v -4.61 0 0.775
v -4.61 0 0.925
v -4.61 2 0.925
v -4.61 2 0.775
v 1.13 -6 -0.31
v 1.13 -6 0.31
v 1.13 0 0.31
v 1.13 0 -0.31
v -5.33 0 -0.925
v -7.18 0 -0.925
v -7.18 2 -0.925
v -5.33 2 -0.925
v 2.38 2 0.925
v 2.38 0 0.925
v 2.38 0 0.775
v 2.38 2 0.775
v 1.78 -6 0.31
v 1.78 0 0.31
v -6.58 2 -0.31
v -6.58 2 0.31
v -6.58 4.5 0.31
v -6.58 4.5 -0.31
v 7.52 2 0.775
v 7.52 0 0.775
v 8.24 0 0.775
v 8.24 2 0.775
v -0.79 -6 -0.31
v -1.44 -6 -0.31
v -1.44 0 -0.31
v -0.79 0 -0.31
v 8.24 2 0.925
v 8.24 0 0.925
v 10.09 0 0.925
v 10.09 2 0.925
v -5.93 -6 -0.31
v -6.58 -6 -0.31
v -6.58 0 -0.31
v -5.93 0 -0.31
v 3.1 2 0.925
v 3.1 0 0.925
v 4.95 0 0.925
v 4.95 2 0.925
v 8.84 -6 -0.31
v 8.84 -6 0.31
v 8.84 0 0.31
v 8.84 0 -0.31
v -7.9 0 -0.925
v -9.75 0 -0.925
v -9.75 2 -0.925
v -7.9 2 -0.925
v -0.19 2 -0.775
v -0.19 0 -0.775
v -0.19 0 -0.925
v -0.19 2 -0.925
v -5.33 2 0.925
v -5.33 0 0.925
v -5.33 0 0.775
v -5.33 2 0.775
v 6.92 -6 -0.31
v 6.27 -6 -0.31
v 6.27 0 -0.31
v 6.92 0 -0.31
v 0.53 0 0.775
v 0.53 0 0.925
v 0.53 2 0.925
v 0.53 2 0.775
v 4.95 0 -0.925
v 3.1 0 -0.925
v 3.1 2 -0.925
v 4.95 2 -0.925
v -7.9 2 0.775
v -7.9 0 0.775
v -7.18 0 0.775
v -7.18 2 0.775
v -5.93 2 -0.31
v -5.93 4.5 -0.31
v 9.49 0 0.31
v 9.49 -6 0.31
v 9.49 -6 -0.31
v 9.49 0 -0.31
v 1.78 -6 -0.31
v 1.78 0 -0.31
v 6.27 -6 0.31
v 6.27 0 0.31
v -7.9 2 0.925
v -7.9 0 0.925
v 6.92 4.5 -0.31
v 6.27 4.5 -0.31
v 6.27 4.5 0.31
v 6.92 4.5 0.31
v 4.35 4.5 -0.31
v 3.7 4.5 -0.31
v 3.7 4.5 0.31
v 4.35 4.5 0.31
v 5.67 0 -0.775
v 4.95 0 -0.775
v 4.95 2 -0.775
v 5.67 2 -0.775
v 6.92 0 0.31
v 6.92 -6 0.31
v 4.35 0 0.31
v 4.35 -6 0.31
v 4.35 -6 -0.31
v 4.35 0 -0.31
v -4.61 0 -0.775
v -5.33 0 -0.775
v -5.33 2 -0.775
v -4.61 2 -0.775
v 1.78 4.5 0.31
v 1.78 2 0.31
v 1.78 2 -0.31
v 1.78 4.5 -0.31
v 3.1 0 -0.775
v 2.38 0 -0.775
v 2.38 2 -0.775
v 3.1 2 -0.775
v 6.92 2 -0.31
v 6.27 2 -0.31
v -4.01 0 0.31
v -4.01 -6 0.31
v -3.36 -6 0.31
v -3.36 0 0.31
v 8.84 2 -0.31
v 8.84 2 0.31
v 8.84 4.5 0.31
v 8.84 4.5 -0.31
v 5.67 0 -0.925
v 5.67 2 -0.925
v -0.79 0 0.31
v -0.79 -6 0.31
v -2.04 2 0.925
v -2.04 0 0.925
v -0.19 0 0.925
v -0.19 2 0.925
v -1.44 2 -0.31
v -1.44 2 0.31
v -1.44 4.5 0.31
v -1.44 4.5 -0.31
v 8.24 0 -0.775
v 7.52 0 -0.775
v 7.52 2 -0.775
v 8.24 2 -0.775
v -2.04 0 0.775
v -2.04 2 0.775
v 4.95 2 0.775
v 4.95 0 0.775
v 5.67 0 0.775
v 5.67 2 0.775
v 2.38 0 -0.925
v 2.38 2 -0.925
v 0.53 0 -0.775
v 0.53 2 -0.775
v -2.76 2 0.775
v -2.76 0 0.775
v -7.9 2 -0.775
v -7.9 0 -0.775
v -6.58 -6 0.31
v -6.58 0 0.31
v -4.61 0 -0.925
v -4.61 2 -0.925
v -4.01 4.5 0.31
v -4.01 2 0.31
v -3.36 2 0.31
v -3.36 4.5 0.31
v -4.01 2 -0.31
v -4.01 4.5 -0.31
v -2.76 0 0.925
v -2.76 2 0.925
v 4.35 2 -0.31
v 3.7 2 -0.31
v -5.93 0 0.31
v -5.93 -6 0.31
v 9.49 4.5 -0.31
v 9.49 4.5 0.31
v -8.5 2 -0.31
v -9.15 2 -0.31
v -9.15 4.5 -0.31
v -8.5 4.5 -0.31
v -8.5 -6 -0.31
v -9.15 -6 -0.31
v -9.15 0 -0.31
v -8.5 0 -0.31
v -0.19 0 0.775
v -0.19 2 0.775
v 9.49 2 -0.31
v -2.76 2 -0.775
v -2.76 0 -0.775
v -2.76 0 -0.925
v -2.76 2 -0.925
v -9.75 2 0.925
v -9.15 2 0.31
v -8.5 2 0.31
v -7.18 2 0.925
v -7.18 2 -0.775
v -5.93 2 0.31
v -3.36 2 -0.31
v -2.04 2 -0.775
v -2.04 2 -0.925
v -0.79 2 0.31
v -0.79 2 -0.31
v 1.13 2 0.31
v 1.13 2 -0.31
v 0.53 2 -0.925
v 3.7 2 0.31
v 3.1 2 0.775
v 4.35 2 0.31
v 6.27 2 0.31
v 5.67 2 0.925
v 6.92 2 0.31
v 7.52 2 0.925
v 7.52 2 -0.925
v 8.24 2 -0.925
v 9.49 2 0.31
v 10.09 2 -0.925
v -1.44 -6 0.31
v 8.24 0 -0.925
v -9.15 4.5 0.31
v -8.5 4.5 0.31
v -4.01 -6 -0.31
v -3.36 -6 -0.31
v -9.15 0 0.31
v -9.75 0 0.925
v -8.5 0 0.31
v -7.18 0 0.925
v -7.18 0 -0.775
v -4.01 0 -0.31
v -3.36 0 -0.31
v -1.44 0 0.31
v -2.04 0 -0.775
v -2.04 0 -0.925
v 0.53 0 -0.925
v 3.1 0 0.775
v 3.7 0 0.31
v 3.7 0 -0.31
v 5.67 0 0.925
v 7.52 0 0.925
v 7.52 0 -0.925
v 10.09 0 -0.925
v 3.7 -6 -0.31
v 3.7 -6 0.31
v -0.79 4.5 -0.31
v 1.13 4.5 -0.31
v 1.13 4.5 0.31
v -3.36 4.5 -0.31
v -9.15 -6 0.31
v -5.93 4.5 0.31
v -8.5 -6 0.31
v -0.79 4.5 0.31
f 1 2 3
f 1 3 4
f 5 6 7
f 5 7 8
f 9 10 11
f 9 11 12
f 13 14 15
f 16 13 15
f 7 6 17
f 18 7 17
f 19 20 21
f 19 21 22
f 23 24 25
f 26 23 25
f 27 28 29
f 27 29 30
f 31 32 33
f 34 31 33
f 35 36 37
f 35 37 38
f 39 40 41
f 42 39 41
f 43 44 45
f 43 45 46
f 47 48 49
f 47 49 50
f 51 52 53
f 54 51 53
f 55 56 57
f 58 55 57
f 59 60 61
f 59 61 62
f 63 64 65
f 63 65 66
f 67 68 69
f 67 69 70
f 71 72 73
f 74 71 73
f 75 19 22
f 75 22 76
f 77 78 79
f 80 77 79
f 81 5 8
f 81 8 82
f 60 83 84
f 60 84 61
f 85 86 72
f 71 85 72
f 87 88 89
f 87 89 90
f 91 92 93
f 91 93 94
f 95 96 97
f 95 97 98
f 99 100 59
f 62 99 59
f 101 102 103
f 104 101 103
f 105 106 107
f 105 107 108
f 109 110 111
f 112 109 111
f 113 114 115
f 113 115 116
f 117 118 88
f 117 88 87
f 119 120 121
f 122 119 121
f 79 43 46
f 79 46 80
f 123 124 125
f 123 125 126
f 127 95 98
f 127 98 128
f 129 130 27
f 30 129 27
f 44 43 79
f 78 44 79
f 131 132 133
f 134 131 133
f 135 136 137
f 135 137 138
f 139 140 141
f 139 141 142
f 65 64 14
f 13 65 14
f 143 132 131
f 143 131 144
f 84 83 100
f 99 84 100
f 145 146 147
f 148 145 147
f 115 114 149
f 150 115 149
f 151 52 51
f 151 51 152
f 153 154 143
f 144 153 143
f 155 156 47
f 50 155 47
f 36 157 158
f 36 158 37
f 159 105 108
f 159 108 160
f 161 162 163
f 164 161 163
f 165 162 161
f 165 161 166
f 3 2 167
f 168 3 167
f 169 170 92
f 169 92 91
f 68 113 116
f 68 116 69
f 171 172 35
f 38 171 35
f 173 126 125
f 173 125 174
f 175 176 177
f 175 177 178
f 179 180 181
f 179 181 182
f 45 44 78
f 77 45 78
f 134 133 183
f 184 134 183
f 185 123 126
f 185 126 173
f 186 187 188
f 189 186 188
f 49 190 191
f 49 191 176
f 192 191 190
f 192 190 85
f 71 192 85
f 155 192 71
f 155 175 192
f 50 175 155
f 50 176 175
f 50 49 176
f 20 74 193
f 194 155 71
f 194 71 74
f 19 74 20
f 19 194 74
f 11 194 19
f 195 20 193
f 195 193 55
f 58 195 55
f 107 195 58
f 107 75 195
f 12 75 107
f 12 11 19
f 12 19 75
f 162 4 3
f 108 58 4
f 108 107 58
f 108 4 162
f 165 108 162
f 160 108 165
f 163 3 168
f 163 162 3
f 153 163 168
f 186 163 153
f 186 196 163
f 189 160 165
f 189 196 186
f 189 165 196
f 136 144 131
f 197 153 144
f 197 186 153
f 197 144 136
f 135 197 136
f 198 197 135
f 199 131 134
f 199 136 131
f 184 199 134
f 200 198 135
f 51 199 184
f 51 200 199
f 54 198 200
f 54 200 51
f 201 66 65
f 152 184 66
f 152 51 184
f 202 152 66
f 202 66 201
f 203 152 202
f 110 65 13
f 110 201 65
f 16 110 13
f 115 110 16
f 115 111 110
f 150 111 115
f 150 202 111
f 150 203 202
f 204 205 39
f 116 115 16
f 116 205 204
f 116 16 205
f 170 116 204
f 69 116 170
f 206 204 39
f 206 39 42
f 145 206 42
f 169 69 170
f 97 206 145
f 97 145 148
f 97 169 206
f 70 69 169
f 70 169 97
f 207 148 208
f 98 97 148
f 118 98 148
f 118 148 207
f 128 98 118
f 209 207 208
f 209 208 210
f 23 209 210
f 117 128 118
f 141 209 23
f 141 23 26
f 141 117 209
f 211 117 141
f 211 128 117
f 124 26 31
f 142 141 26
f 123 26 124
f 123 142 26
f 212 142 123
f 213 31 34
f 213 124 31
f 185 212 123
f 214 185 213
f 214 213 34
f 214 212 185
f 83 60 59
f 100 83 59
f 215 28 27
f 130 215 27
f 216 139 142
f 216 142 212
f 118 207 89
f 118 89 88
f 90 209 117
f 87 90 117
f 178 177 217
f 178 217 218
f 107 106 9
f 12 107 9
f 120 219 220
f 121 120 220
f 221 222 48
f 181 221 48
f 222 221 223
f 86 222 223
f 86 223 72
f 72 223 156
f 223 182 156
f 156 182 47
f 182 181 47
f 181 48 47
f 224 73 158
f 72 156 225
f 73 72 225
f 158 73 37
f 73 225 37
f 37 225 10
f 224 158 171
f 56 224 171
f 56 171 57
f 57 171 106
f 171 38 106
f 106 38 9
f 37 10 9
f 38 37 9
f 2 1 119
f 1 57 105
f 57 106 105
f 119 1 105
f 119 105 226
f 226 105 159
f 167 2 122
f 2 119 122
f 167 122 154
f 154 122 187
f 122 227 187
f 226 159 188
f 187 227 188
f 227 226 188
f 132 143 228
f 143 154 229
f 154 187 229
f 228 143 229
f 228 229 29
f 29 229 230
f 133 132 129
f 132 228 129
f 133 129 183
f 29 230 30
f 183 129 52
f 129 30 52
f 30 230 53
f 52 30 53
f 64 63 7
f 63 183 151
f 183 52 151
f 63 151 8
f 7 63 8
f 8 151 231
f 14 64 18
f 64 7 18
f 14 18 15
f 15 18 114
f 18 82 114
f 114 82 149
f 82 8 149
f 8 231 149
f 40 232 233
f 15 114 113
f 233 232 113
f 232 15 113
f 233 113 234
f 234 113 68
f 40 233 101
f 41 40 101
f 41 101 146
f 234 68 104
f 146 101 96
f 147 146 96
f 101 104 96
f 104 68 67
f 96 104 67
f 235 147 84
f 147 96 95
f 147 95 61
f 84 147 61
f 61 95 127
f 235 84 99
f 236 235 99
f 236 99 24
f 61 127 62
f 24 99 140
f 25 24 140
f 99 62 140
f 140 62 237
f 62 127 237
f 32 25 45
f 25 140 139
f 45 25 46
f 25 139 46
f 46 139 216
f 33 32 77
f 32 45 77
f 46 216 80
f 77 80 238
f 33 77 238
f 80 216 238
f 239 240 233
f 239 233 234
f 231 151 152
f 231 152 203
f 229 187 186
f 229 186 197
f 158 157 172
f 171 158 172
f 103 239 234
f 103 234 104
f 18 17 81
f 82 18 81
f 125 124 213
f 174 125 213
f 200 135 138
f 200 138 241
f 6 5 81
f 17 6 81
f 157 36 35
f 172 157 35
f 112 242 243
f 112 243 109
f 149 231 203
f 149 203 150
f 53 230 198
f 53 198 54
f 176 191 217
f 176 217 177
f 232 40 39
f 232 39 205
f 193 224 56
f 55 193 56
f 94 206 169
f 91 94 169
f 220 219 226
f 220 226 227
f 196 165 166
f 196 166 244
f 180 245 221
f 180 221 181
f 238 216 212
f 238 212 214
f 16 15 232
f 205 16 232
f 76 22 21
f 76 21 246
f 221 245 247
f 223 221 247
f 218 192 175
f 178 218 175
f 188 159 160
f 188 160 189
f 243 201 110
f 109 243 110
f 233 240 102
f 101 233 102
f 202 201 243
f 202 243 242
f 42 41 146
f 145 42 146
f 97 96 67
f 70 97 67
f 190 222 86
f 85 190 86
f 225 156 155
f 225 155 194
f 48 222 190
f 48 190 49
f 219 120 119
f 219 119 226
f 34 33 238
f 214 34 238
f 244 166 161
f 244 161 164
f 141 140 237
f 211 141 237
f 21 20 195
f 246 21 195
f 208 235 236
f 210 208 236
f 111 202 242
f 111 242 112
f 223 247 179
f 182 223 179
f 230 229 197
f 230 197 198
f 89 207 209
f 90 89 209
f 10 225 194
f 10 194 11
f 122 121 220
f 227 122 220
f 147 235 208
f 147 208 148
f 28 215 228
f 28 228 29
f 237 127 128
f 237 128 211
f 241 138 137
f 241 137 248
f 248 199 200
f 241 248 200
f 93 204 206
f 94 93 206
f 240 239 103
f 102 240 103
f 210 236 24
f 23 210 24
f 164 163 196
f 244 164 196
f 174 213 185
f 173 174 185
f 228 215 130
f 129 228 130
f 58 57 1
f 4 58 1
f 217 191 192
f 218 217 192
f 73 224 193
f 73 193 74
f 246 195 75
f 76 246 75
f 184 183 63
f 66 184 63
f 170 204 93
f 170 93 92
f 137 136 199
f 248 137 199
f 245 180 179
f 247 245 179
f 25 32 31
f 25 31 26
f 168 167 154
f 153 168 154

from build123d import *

# Parameters (mm, degrees)
SKETCH1_W                = 0.65
SKETCH1_H                = 0.62
BOSS_EXTRUDE1_DEPTH      = 2
BOSS_EXTRUDE2_DEPTH      = 4.5
BOSS_EXTRUDE2_DEPTH_BACK = 6
SKETCH1_3_W              = 0.65
SKETCH1_3_H              = 0.62


with BuildPart() as part:
    # Sketch1 → Boss-Extrude1 (new body)
    with BuildSketch(Plane(origin=(0, 0, 0), x_dir=(1, 0, 0), z_dir=(0, 1, 0))):
        Polygon((-7.9, 0.925), (-9.75, 0.925), (-9.75, -0.925), (-7.9, -0.925), (-7.9, -0.775), (-7.18, -0.775), (-7.18, -0.925), (-5.33, -0.925), (-5.33, -0.775), (-4.61, -0.775), (-4.61, -0.925), (-2.76, -0.925), (-2.76, -0.775), (-2.04, -0.775), (-2.04, -0.925), (-0.19, -0.925), (-0.19, -0.775), (0.53, -0.775), (0.53, -0.925), (2.38, -0.925), (2.38, -0.775), (3.1, -0.775), (3.1, -0.925), (4.95, -0.925), (4.95, -0.775), (5.67, -0.775), (5.67, -0.925), (7.52, -0.925), (7.52, -0.775), (8.24, -0.775), (8.24, -0.925), (10.09, -0.925), (10.09, 0.925), (8.24, 0.925), (8.24, 0.775), (7.52, 0.775), (7.52, 0.925), (5.67, 0.925), (5.67, 0.775), (4.95, 0.775), (4.95, 0.925), (3.1, 0.925), (3.1, 0.775), (2.38, 0.775), (2.38, 0.925), (0.53, 0.925), (0.53, 0.775), (-0.19, 0.775), (-0.19, 0.925), (-2.04, 0.925), (-2.04, 0.775), (-2.76, 0.775), (-2.76, 0.925), (-4.61, 0.925), (-4.61, 0.775), (-5.33, 0.775), (-5.33, 0.925), (-7.18, 0.925), (-7.18, 0.775), (-7.9, 0.775), align=None)
        with Locations((-8.825, 0)):
            Rectangle(SKETCH1_W, SKETCH1_H, mode=Mode.SUBTRACT)
        with Locations((-6.255, 0)):
            Rectangle(SKETCH1_W, SKETCH1_H, mode=Mode.SUBTRACT)
        with Locations((-3.685, 0)):
            Rectangle(SKETCH1_W, SKETCH1_H, mode=Mode.SUBTRACT)
        with Locations((-1.115, 0)):
            Rectangle(SKETCH1_W, SKETCH1_H, mode=Mode.SUBTRACT)
        with Locations((1.455, 0)):
            Rectangle(SKETCH1_W, SKETCH1_H, mode=Mode.SUBTRACT)
        with Locations((4.025, 0)):
            Rectangle(SKETCH1_W, SKETCH1_H, mode=Mode.SUBTRACT)
        with Locations((6.595, 0)):
            Rectangle(SKETCH1_W, SKETCH1_H, mode=Mode.SUBTRACT)
        with Locations((9.165, 0)):
            Rectangle(SKETCH1_W, SKETCH1_H, mode=Mode.SUBTRACT)
    extrude(amount=BOSS_EXTRUDE1_DEPTH)

    # Sketch1<3> → Boss-Extrude2 (add, two sides: drawn at the far end of the back side and taken through both)
    with BuildSketch(Plane(origin=(0, 0, 0), x_dir=(1, 0, 0), z_dir=(0, 1, 0)).offset(-BOSS_EXTRUDE2_DEPTH_BACK)):
        with Locations((-6.255, 0)):
            Rectangle(SKETCH1_3_W, SKETCH1_3_H)
        with Locations((-8.825, 0)):
            Rectangle(SKETCH1_3_W, SKETCH1_3_H)
        with Locations((-3.685, 0)):
            Rectangle(SKETCH1_3_W, SKETCH1_3_H)
        with Locations((-1.115, 0)):
            Rectangle(SKETCH1_3_W, SKETCH1_3_H)
        with Locations((1.455, 0)):
            Rectangle(SKETCH1_3_W, SKETCH1_3_H)
        with Locations((4.025, 0)):
            Rectangle(SKETCH1_3_W, SKETCH1_3_H)
        with Locations((6.595, 0)):
            Rectangle(SKETCH1_3_W, SKETCH1_3_H)
        with Locations((9.165, 0)):
            Rectangle(SKETCH1_3_W, SKETCH1_3_H)
    extrude(amount=BOSS_EXTRUDE2_DEPTH + BOSS_EXTRUDE2_DEPTH_BACK)


solid = part.part
